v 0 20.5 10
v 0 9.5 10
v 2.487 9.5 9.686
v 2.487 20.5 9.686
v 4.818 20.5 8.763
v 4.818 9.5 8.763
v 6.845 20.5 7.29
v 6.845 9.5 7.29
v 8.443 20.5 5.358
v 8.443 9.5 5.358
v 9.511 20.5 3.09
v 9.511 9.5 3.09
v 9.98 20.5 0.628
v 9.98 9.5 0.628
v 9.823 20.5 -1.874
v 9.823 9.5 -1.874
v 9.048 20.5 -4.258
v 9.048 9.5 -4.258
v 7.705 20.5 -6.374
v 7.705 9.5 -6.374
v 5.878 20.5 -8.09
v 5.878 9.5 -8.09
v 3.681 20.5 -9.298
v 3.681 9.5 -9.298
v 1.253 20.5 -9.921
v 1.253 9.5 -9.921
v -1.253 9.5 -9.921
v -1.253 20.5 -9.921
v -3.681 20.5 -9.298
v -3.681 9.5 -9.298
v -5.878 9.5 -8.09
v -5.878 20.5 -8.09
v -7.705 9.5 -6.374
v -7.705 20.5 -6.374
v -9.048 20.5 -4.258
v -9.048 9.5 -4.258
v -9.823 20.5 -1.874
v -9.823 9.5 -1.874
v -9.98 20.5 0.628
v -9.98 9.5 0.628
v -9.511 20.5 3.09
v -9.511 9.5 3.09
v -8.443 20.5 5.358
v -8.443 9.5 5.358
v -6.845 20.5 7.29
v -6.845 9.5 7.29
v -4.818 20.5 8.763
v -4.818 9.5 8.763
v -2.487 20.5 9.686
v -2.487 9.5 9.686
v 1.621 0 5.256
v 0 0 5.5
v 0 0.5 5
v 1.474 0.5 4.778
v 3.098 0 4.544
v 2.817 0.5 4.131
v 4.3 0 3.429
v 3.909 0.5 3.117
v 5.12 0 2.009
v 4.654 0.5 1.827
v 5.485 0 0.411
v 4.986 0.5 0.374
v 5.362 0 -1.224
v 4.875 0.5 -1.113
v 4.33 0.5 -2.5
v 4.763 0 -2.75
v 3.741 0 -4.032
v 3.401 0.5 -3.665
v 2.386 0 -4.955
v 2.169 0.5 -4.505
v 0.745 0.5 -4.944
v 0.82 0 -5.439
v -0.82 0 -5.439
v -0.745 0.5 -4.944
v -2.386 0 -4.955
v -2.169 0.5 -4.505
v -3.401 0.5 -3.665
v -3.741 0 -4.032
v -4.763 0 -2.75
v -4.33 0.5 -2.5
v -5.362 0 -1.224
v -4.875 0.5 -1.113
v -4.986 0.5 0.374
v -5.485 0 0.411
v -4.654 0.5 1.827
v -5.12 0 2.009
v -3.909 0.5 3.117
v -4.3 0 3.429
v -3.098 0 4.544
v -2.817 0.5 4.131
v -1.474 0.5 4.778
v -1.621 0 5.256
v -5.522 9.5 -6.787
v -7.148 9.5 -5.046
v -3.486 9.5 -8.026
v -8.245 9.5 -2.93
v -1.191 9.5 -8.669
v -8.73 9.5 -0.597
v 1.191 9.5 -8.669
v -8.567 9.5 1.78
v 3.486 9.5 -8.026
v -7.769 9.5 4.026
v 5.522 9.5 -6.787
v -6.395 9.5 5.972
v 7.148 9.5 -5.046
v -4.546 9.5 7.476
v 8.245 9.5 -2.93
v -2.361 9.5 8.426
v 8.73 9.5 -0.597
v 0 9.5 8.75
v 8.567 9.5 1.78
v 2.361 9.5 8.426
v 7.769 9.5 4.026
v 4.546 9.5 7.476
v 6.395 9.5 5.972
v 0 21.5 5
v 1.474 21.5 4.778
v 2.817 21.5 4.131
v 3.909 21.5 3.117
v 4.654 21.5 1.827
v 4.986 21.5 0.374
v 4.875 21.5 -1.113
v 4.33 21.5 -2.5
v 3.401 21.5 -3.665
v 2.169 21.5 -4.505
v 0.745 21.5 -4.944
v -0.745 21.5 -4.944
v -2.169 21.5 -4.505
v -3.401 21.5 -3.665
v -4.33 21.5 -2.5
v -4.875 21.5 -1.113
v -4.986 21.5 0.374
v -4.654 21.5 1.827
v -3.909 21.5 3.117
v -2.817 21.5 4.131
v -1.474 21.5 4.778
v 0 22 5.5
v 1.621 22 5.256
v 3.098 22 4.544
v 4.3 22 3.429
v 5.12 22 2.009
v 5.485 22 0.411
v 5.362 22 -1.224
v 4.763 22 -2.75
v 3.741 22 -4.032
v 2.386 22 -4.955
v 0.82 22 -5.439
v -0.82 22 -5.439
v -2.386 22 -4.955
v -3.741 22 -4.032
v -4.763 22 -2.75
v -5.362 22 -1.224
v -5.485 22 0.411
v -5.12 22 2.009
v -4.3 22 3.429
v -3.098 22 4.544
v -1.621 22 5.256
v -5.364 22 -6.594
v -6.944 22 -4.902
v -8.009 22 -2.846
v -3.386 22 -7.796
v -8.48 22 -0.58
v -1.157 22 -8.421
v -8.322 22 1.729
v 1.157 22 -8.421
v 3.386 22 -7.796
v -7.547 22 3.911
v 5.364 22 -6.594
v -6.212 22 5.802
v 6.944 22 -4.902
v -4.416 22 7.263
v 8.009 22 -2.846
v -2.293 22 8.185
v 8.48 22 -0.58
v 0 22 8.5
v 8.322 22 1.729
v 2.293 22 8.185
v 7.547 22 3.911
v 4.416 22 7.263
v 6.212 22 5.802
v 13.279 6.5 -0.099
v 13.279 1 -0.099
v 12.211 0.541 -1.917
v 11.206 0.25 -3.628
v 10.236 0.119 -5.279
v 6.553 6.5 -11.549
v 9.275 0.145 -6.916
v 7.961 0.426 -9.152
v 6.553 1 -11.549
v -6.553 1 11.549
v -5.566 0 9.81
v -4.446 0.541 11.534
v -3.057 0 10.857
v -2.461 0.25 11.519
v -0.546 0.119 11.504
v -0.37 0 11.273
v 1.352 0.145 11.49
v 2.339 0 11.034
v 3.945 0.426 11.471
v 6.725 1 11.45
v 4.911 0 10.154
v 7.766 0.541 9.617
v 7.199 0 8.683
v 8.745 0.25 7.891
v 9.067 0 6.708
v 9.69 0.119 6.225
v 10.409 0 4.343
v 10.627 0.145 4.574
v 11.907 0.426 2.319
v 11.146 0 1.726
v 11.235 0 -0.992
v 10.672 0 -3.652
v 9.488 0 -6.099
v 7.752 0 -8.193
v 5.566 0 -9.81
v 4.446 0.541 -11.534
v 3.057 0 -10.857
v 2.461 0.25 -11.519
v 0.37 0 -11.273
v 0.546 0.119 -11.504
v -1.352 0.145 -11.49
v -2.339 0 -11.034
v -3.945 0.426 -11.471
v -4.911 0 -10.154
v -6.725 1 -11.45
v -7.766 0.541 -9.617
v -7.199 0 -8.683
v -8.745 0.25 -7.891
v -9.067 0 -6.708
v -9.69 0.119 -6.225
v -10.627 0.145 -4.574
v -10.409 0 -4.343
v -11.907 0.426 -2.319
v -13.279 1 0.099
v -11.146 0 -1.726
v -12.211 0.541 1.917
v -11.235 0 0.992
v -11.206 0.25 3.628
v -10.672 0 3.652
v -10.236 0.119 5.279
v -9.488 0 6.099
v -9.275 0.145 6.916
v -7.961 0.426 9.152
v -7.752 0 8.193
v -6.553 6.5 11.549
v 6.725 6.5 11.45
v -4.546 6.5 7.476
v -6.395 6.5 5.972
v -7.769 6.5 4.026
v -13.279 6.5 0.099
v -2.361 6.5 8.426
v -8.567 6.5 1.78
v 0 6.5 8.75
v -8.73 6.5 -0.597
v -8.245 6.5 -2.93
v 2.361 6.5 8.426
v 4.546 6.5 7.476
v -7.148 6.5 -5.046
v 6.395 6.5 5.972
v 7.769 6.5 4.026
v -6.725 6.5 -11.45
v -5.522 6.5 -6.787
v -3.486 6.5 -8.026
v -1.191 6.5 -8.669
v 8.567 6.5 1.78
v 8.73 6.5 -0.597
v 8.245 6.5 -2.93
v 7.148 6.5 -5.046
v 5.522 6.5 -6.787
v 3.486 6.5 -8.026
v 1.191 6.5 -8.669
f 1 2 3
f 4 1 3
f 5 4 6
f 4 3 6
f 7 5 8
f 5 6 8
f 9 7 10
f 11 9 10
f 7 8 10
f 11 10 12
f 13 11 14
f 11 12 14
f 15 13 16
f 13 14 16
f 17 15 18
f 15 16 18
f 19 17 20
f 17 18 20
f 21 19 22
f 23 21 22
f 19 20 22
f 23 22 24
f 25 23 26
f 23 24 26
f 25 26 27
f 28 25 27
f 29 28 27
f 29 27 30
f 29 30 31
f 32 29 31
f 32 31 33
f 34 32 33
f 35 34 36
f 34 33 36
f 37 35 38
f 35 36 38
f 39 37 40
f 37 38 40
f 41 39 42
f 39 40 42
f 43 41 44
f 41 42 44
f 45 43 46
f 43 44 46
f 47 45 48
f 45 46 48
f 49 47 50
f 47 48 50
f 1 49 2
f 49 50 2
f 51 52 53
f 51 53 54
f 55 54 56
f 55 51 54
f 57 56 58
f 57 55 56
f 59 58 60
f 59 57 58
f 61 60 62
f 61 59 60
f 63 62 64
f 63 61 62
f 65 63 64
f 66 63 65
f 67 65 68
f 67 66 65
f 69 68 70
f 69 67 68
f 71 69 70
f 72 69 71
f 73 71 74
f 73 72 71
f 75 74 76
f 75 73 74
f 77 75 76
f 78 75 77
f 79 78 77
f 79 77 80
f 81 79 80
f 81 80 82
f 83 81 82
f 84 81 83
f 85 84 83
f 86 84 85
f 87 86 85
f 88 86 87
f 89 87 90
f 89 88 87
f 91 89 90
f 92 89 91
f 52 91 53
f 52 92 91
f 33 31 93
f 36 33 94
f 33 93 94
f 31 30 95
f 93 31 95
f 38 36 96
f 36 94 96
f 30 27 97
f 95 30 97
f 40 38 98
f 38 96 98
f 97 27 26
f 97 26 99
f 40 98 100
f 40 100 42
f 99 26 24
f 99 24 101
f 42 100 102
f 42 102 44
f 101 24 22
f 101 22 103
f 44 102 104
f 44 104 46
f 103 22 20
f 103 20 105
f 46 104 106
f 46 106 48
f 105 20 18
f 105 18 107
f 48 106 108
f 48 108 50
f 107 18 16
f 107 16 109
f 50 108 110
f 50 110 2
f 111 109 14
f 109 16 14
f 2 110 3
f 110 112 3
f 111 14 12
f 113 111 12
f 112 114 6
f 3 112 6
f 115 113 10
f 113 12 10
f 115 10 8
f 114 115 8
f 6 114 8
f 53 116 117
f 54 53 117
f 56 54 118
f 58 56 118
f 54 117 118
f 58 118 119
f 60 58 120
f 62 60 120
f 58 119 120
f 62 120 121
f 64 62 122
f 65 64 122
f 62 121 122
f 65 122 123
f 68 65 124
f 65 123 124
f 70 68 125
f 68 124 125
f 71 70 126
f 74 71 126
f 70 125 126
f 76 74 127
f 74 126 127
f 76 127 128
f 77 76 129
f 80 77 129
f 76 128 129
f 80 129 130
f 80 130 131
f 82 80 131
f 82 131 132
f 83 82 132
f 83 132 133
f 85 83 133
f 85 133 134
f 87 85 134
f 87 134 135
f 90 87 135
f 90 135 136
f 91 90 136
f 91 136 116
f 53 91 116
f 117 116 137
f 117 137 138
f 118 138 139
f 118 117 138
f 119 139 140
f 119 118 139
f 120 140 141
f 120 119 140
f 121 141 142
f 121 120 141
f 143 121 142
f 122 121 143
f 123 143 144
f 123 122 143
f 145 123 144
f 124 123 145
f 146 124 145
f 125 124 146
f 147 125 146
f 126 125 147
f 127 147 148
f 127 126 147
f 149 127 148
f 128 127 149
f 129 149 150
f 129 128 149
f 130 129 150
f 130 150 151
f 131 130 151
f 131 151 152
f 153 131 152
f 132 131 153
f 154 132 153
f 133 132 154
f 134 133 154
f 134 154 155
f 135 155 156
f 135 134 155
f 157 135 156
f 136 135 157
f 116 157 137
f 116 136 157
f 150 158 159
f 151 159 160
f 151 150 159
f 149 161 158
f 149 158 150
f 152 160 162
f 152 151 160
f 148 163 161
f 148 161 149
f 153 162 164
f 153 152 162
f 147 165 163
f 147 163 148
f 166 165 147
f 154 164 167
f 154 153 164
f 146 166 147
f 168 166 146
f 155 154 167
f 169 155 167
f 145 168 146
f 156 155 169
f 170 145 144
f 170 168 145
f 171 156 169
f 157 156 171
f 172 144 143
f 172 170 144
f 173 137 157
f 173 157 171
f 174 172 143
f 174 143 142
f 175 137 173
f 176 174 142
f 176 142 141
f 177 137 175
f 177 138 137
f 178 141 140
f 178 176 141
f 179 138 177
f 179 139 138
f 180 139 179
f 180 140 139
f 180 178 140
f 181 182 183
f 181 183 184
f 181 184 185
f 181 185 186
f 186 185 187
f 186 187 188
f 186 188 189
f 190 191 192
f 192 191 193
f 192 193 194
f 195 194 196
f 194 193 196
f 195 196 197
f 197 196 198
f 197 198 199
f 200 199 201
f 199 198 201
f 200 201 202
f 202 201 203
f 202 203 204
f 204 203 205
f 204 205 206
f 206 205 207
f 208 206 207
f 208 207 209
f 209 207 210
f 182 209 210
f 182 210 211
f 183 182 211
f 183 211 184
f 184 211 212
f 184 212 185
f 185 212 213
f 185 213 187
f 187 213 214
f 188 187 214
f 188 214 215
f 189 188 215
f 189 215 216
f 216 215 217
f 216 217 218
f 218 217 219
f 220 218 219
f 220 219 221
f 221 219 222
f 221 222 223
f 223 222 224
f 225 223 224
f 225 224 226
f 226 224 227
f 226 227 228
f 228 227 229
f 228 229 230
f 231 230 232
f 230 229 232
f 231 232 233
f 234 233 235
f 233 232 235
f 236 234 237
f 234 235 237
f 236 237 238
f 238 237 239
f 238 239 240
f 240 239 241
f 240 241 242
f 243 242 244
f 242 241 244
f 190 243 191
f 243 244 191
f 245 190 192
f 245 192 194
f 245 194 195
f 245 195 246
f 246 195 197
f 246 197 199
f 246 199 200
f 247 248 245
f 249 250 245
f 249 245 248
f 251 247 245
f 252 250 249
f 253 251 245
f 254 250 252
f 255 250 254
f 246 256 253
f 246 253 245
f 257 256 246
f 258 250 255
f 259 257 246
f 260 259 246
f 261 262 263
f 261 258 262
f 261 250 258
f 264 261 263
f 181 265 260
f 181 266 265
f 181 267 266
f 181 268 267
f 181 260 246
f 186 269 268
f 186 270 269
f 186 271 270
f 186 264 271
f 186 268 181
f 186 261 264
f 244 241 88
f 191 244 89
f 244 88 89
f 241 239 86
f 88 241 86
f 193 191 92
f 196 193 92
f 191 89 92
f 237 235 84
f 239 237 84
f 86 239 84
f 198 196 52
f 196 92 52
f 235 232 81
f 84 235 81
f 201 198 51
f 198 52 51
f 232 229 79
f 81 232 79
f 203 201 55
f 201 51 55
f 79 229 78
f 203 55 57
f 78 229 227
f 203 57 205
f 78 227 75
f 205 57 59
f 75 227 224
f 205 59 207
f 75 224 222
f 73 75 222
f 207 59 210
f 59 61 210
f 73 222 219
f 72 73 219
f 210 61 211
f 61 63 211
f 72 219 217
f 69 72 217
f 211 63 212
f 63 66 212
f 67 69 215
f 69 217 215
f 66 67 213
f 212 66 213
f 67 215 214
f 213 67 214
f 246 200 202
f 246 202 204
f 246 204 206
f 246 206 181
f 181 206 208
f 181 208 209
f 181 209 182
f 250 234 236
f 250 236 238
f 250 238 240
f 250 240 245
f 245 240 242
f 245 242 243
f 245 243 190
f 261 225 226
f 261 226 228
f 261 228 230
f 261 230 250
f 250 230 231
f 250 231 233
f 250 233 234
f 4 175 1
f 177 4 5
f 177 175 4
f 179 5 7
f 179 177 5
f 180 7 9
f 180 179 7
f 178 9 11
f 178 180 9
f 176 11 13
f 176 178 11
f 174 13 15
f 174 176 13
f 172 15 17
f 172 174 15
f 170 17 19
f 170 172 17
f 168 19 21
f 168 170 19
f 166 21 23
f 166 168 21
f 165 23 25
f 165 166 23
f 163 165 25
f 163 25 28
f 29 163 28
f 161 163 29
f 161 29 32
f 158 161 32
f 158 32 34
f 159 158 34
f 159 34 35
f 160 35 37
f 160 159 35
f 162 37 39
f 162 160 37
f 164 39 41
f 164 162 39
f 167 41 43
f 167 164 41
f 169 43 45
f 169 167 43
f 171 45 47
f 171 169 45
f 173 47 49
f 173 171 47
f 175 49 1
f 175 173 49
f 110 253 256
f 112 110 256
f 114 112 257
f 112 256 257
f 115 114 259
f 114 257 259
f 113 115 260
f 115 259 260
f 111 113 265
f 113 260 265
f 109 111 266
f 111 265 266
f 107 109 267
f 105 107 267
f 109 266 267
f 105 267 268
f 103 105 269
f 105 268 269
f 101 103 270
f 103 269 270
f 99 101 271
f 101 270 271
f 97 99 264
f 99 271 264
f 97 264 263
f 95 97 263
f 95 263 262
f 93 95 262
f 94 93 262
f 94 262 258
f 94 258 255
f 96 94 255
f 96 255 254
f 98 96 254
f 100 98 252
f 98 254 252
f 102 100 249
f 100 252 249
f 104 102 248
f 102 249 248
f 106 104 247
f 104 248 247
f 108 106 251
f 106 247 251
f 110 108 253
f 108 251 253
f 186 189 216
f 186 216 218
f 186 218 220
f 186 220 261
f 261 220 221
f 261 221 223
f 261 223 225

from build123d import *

# Parameters (mm, degrees)
EXTRUDE_1_DEPTH     = 6.5
SKETCH_2_R          = 8.75
EXTRUDE_2_DEPTH     = 3
SKETCH_3_R          = 10
EXTRUDE_3_DEPTH     = 12.5
CHAMFER_1_SIZE      = 1.5
SKETCH_6_R          = 5
CUT_EXTRUDE_1_DEPTH = 29.172880507
CHAMFER_2_SIZE      = 0.5


with BuildPart() as part:
    # 草图1 → 凸台-拉伸1 (new body)
    with BuildSketch(Plane(origin=(0, 0, 0), x_dir=(1, 0, 0), z_dir=(0, 1, 0))):
        Polygon((6.553289027, 11.549360859), (-6.725395388, 11.449995205), (-13.278684415, -0.099365654), (-6.553289027, -11.549360859), (6.725395388, -11.449995205), (13.278684415, 0.099365654), align=None)
    extrude(amount=EXTRUDE_1_DEPTH)

    # 草图2 → 凸台-拉伸2 (add)
    with BuildSketch(Plane(origin=(0, 6.5, 0), x_dir=(1, 0, 0), z_dir=(0, 1, 0))):
        with Locations(Location((0, 0, 0), (0, 0, 270))):
            Circle(SKETCH_2_R)
    extrude(amount=EXTRUDE_2_DEPTH)

    # 草图3 → 凸台-拉伸3 (add)
    with BuildSketch(Plane(origin=(0, 9.5, 0), x_dir=(1, 0, 0), z_dir=(0, 1, 0))):
        with Locations(Location((0, 0, 0), (0, 0, 270))):
            Circle(SKETCH_3_R)
    extrude(amount=EXTRUDE_3_DEPTH)

    # 倒角1
    chamfer_1_edges = [part.edges().sort_by_distance(p)[0] for p in [
        (0, 22, -10),
    ]]
    chamfer(chamfer_1_edges, length=CHAMFER_1_SIZE)

    # 草图5 → 切除-旋转3 (revolve, cut)
    with BuildSketch(Plane(origin=(0, 0, 0), x_dir=(0.49350563267132574, 0, -0.8697426001534446), z_dir=(0.8697426001534445, 0, 0.4935056326713257)), mode=Mode.PRIVATE) as cut_revolve_3_sk:
        Polygon((13.279056191, 1), (11.279056191, 0), (13.279056191, 0), align=None)
    revolve(cut_revolve_3_sk.sketch.rotate(Axis((0, -1000, 0), (0, 1, 0)), 180.000000003), axis=Axis((0, -1000, 0), (0, 1, 0)), mode=Mode.SUBTRACT)

    # 草图6 → 切除-拉伸1 (cut, through all)
    with BuildSketch(Plane(origin=(0, 22, 0), x_dir=(1, 0, 0), z_dir=(0, 1, 0))):
        with Locations(Location((0, 0, 0), (0, 0, 270))):
            Circle(SKETCH_6_R)
    extrude(amount=-CUT_EXTRUDE_1_DEPTH, mode=Mode.SUBTRACT)

    # 倒角2
    chamfer_2_edges = [part.edges().sort_by_distance(p)[0] for p in [
        (0, 0, -5),
        (0, 22, -5),
    ]]
    chamfer(chamfer_2_edges, length=CHAMFER_2_SIZE)


solid = part.part
